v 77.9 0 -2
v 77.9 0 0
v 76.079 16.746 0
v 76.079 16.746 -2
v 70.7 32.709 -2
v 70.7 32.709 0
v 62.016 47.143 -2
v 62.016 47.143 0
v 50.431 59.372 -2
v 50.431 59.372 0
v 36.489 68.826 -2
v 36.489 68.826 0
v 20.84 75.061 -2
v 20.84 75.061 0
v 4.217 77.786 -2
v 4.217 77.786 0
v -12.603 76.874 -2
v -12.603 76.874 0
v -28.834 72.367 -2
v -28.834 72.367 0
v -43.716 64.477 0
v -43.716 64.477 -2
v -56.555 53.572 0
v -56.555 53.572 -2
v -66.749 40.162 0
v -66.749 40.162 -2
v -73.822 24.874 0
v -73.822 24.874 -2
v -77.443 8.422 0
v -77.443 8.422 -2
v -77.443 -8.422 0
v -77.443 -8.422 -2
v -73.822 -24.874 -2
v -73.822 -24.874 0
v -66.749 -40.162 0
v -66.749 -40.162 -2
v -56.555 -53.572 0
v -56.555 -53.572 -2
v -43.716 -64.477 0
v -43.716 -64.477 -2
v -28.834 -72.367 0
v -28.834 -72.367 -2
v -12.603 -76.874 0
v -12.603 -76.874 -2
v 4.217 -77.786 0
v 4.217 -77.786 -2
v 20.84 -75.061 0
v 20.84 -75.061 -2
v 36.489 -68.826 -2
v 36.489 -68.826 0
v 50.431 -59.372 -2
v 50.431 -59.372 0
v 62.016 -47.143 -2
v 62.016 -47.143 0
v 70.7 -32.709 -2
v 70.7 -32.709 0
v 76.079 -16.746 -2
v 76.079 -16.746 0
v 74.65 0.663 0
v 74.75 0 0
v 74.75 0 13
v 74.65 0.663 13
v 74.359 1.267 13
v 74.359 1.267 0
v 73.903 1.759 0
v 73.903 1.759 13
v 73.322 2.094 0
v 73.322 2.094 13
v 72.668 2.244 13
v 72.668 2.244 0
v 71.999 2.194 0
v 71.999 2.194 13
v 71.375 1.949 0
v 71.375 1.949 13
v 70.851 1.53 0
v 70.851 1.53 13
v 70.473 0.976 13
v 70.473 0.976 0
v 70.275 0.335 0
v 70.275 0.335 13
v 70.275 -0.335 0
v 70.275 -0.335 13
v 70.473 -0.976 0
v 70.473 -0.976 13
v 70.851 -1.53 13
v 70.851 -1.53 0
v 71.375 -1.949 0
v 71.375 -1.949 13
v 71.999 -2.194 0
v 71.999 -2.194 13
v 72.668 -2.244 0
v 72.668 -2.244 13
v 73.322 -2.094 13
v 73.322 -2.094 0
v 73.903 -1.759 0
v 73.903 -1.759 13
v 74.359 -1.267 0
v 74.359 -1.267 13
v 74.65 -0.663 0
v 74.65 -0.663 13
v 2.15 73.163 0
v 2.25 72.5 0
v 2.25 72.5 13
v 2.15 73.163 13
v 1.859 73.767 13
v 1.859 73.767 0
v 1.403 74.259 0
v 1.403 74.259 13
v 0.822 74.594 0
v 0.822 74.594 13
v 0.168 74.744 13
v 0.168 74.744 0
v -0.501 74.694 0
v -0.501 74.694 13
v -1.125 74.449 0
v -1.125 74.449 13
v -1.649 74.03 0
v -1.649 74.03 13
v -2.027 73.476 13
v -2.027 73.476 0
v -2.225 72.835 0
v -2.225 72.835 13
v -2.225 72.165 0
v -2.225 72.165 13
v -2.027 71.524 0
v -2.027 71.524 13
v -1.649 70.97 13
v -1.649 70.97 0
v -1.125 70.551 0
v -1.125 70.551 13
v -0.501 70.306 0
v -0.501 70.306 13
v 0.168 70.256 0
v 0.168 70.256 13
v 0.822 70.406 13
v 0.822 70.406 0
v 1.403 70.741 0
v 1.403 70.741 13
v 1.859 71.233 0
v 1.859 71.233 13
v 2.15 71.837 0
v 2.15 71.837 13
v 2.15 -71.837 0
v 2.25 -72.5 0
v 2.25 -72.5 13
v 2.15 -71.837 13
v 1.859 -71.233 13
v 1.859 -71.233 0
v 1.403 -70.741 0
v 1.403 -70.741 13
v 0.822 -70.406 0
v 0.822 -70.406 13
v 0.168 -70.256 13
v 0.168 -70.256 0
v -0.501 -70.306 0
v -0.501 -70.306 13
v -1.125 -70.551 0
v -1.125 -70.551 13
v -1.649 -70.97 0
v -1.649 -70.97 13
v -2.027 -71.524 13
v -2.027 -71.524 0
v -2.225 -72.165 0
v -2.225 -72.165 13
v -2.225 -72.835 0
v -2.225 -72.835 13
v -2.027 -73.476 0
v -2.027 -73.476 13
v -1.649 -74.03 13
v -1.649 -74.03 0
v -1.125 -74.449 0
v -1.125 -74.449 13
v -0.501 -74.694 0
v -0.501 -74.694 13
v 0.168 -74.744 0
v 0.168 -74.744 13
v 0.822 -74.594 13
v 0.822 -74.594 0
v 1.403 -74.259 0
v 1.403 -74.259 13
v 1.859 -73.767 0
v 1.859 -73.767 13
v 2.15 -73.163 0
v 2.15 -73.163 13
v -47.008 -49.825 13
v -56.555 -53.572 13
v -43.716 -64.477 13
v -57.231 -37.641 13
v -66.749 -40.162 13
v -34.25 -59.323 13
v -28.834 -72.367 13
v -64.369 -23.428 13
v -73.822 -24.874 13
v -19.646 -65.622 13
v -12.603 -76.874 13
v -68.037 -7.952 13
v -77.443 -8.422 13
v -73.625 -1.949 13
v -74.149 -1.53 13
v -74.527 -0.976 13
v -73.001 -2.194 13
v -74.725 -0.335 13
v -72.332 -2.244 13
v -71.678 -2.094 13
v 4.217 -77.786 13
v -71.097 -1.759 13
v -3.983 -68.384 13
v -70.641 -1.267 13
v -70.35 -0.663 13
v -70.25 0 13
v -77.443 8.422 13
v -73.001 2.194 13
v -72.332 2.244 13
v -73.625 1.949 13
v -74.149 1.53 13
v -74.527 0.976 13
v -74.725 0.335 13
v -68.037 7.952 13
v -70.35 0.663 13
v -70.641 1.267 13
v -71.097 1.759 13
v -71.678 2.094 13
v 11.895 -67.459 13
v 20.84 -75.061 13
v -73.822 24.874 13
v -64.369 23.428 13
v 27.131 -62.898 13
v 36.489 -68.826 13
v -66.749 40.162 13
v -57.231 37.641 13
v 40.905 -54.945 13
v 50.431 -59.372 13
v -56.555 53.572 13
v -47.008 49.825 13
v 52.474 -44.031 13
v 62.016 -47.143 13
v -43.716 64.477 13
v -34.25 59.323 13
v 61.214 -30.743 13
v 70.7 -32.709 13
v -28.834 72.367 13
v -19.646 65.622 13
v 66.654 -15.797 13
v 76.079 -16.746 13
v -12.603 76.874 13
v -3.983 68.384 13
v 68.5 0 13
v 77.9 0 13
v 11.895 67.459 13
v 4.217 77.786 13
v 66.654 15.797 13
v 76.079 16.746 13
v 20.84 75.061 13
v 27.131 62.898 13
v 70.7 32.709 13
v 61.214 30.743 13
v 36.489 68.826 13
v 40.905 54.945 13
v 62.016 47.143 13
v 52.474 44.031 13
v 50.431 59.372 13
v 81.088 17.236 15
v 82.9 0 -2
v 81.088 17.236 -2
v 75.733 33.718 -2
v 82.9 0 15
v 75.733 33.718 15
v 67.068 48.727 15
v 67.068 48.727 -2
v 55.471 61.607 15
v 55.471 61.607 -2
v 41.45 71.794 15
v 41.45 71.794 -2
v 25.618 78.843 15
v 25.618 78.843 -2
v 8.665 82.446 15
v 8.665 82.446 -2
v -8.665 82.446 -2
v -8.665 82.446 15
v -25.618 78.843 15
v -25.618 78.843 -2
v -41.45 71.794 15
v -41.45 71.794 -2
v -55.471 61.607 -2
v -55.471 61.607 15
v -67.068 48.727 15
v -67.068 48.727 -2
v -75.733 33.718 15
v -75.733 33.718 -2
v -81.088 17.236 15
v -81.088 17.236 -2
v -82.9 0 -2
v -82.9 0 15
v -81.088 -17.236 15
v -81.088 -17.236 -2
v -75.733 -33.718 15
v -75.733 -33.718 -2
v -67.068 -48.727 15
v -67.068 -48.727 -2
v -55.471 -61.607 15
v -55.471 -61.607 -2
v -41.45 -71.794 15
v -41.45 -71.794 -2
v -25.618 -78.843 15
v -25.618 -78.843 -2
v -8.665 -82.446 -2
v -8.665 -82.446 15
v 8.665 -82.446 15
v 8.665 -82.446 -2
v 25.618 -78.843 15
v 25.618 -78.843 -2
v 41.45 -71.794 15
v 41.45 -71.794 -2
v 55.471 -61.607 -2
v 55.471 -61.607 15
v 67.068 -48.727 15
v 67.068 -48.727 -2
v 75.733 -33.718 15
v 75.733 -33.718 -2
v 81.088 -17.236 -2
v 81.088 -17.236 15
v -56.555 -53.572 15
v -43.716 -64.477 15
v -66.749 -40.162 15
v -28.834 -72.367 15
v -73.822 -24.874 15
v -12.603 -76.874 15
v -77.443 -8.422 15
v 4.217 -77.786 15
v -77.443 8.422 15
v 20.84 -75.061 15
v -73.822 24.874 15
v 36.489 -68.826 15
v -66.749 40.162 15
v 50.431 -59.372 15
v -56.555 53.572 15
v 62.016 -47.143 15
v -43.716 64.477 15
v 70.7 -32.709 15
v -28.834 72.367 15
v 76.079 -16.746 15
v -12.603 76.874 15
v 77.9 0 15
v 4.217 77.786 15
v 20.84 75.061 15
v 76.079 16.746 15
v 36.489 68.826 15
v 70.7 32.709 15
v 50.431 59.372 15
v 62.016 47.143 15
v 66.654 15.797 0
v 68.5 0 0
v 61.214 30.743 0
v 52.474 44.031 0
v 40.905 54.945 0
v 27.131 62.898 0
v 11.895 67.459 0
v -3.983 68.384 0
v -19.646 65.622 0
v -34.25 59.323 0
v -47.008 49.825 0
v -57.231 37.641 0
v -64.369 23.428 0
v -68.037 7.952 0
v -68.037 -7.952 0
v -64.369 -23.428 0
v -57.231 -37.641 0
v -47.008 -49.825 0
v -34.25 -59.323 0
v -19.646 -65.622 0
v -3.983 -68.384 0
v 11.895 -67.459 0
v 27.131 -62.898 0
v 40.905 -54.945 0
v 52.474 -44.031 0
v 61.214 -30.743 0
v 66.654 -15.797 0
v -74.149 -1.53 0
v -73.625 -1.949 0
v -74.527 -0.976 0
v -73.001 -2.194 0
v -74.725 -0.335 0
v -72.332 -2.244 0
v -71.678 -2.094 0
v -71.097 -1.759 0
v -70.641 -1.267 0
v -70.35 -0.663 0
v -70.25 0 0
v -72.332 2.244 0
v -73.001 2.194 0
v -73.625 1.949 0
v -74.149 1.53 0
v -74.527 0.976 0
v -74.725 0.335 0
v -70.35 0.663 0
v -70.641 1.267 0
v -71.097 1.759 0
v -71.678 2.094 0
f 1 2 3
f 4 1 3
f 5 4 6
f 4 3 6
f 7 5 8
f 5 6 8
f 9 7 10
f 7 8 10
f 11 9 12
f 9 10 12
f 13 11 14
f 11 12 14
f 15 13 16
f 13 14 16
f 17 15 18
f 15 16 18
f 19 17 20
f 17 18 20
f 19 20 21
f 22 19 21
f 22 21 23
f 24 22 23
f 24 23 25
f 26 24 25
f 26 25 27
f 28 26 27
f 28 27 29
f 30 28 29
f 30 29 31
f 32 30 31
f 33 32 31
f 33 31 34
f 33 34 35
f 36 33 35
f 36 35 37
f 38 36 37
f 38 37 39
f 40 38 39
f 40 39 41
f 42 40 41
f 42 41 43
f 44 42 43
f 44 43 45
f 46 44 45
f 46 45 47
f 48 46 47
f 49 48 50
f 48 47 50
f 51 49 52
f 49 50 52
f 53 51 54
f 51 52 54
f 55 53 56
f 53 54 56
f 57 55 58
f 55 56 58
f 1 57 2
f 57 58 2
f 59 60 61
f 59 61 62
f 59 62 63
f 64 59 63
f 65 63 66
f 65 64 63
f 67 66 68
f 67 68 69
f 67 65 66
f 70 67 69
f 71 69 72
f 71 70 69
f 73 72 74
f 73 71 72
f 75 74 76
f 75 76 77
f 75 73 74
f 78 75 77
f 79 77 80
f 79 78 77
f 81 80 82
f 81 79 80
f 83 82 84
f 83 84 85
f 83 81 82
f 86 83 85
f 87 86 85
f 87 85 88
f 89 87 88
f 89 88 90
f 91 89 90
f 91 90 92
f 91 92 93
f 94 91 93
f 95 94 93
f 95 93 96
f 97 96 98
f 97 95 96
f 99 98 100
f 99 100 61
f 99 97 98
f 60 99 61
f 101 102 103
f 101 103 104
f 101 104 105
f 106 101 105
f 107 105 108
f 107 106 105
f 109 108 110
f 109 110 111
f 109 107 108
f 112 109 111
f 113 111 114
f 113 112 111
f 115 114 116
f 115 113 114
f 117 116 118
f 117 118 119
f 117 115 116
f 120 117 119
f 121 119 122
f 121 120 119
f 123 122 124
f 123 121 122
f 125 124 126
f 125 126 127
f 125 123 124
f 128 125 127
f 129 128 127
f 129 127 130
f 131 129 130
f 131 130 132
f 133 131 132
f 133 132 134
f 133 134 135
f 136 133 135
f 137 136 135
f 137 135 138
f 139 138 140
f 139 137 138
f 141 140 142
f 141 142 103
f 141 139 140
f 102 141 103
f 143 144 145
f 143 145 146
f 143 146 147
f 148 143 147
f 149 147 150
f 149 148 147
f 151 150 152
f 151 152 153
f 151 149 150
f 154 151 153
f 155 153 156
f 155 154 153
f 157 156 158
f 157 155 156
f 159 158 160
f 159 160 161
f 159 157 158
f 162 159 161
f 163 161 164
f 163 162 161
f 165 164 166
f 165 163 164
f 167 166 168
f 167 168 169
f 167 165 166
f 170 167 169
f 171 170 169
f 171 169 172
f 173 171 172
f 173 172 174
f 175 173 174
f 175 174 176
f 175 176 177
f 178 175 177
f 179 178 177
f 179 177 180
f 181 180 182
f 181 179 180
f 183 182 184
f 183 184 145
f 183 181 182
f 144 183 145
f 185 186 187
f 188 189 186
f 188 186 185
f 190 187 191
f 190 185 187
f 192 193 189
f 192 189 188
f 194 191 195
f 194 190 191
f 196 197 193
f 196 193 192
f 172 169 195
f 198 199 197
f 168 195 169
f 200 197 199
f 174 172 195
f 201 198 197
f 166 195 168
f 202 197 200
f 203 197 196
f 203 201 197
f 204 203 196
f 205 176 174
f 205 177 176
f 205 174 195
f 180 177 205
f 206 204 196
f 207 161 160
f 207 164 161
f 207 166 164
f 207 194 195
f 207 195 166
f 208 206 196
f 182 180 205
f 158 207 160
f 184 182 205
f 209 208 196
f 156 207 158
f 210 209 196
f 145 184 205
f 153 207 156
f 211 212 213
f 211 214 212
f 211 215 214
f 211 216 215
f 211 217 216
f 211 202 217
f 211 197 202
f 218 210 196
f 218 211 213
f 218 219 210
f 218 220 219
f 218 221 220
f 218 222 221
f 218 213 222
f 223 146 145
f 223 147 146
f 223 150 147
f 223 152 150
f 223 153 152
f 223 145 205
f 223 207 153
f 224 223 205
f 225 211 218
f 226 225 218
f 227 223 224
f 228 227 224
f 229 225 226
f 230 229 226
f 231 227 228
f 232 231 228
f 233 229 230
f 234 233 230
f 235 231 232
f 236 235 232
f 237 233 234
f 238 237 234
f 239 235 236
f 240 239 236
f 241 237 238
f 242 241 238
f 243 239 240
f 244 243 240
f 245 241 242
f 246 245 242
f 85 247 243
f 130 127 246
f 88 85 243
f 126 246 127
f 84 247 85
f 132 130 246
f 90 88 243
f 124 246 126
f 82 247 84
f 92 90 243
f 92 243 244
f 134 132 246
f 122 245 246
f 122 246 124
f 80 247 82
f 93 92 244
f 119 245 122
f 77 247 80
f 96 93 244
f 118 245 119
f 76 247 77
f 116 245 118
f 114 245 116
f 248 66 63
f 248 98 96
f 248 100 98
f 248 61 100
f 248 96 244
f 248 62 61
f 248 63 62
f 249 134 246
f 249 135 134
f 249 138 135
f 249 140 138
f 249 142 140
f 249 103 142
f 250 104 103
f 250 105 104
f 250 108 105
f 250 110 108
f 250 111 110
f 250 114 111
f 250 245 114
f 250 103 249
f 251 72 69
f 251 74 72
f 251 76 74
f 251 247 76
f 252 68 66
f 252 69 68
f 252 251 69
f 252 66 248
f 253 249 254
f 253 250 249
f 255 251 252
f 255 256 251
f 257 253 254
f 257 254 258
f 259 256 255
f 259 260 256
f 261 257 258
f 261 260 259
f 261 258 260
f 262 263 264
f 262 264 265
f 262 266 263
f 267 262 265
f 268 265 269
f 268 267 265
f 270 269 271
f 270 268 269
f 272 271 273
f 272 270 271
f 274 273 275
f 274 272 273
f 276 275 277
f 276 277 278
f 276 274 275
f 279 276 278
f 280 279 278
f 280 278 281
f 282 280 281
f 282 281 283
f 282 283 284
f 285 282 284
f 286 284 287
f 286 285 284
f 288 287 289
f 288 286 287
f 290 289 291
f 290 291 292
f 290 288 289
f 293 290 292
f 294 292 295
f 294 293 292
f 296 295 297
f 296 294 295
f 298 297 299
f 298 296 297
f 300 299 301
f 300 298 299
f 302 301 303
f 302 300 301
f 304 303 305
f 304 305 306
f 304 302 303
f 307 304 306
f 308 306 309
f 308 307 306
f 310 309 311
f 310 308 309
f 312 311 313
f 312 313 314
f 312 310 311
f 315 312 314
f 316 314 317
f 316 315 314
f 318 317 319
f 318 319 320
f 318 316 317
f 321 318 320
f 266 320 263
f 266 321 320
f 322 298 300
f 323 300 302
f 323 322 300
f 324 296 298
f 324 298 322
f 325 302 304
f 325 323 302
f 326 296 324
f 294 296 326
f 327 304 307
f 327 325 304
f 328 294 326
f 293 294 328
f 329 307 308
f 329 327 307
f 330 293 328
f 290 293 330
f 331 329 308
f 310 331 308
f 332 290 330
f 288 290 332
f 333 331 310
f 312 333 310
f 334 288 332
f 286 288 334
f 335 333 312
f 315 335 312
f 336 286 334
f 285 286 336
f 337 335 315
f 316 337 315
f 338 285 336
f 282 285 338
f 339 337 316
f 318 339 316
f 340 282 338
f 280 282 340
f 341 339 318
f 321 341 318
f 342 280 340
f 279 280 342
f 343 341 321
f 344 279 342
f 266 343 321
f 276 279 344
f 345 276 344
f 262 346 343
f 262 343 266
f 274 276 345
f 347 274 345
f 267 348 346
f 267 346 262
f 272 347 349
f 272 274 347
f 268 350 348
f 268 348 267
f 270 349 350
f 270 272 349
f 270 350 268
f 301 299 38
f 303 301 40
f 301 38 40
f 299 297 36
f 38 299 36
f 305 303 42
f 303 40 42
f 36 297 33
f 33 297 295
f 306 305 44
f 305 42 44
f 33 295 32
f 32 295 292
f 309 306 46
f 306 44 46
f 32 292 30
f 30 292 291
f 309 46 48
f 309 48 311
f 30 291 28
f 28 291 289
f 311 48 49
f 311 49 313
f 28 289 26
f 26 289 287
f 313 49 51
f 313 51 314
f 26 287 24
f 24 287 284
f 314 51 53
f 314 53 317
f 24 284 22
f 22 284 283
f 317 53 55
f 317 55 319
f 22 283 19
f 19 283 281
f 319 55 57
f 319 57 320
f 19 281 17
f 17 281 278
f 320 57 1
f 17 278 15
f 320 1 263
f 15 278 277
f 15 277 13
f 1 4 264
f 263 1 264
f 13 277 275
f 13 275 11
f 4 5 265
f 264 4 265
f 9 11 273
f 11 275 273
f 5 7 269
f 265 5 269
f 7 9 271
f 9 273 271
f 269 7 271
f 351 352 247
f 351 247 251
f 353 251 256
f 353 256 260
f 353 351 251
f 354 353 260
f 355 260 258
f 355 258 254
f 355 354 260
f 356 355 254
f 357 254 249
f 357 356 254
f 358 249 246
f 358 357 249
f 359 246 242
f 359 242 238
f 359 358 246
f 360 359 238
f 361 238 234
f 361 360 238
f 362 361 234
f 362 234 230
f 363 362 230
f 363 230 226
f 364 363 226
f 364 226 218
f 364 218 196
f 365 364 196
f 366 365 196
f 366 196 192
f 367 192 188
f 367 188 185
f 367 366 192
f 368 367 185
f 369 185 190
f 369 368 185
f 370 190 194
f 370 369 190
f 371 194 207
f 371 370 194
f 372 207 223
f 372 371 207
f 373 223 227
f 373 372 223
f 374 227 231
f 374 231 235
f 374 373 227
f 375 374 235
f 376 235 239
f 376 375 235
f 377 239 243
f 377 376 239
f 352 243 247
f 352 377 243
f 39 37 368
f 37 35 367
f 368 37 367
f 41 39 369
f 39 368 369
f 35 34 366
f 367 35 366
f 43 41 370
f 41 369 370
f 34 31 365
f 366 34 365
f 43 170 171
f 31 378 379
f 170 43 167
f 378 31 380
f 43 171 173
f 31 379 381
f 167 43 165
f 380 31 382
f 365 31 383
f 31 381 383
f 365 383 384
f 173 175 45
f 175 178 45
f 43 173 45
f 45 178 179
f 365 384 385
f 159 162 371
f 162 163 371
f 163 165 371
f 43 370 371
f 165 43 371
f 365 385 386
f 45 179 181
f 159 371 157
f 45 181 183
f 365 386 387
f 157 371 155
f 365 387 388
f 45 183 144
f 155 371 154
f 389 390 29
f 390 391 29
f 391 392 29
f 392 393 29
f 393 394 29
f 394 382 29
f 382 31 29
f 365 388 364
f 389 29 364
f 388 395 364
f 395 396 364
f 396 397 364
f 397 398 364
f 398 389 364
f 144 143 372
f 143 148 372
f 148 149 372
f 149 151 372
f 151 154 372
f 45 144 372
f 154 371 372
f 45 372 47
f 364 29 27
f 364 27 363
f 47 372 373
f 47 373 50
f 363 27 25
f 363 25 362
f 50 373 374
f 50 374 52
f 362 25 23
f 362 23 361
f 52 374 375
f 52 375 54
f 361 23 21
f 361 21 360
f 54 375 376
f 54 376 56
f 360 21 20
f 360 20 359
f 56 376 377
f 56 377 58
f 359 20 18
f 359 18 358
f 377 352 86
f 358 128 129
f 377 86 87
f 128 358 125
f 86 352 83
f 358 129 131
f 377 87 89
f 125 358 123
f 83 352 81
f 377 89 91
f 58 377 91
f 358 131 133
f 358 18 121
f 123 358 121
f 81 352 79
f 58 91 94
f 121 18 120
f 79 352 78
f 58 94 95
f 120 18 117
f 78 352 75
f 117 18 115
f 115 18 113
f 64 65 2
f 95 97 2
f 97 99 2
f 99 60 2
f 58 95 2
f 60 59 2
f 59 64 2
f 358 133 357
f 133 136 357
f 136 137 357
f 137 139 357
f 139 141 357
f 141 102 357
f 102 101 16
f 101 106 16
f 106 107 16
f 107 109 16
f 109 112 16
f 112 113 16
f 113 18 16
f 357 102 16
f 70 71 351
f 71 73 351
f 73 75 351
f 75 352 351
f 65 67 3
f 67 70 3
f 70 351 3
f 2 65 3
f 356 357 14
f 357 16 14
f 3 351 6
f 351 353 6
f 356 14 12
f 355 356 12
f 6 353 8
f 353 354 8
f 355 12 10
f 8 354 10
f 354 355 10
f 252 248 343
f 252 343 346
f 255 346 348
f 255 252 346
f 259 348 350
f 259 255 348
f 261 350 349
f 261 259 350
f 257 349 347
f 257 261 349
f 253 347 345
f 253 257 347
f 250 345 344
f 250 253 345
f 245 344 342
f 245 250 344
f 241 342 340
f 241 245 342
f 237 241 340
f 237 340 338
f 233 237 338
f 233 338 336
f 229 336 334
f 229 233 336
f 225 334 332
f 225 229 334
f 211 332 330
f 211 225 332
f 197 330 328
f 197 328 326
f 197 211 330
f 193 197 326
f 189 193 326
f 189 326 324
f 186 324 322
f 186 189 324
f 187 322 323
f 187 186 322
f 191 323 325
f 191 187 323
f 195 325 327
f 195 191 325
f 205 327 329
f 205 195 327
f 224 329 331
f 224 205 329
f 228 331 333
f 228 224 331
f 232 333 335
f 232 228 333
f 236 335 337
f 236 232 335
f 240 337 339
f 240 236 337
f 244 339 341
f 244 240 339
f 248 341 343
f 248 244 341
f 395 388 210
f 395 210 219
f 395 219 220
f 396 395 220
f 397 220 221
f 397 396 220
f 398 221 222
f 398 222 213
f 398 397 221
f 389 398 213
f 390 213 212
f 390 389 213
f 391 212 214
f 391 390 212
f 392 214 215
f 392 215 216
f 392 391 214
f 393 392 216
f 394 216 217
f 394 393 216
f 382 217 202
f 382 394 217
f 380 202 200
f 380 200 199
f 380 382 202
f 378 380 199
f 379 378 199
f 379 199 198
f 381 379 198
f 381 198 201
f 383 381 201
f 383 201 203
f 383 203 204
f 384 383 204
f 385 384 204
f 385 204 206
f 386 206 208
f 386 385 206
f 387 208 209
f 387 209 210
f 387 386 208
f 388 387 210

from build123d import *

# Parameters (mm, degrees)
ESQUISSE1_R             = 77.9
ESQUISSE1_R_2           = 2.25
ESQUISSE1_R_3           = 68.5
BOSS_EXTRU_1_DEPTH      = 13
BOSS_EXTRU_2_DEPTH      = 2
BOSS_EXTRU_2_DEPTH_BACK = 15
ESQUISSE2_R             = 82.9
ESQUISSE2_R_2           = 77.9


with BuildPart() as part:
    # Esquisse1 → Boss.-Extru.1 (new body)
    with BuildSketch(Plane.XY):
        Circle(ESQUISSE1_R)
        with Locations((0, -72.5)):
            Circle(ESQUISSE1_R_2, mode=Mode.SUBTRACT)
        with Locations((72.5, 0)):
            Circle(ESQUISSE1_R_2, mode=Mode.SUBTRACT)
        with Locations((-72.5, 0)):
            Circle(ESQUISSE1_R_2, mode=Mode.SUBTRACT)
        with Locations((0, 72.5)):
            Circle(ESQUISSE1_R_2, mode=Mode.SUBTRACT)
        Circle(ESQUISSE1_R_3, mode=Mode.SUBTRACT)
    extrude(amount=BOSS_EXTRU_1_DEPTH)

    # Esquisse2 → Boss.-Extru.2 (add, two sides: drawn at the far end of the back side and taken through both)
    with BuildSketch(Plane.XY.offset(13).offset(-BOSS_EXTRU_2_DEPTH_BACK)):
        Circle(ESQUISSE2_R)
        Circle(ESQUISSE2_R_2, mode=Mode.SUBTRACT)
    extrude(amount=BOSS_EXTRU_2_DEPTH + BOSS_EXTRU_2_DEPTH_BACK)


solid = part.part
